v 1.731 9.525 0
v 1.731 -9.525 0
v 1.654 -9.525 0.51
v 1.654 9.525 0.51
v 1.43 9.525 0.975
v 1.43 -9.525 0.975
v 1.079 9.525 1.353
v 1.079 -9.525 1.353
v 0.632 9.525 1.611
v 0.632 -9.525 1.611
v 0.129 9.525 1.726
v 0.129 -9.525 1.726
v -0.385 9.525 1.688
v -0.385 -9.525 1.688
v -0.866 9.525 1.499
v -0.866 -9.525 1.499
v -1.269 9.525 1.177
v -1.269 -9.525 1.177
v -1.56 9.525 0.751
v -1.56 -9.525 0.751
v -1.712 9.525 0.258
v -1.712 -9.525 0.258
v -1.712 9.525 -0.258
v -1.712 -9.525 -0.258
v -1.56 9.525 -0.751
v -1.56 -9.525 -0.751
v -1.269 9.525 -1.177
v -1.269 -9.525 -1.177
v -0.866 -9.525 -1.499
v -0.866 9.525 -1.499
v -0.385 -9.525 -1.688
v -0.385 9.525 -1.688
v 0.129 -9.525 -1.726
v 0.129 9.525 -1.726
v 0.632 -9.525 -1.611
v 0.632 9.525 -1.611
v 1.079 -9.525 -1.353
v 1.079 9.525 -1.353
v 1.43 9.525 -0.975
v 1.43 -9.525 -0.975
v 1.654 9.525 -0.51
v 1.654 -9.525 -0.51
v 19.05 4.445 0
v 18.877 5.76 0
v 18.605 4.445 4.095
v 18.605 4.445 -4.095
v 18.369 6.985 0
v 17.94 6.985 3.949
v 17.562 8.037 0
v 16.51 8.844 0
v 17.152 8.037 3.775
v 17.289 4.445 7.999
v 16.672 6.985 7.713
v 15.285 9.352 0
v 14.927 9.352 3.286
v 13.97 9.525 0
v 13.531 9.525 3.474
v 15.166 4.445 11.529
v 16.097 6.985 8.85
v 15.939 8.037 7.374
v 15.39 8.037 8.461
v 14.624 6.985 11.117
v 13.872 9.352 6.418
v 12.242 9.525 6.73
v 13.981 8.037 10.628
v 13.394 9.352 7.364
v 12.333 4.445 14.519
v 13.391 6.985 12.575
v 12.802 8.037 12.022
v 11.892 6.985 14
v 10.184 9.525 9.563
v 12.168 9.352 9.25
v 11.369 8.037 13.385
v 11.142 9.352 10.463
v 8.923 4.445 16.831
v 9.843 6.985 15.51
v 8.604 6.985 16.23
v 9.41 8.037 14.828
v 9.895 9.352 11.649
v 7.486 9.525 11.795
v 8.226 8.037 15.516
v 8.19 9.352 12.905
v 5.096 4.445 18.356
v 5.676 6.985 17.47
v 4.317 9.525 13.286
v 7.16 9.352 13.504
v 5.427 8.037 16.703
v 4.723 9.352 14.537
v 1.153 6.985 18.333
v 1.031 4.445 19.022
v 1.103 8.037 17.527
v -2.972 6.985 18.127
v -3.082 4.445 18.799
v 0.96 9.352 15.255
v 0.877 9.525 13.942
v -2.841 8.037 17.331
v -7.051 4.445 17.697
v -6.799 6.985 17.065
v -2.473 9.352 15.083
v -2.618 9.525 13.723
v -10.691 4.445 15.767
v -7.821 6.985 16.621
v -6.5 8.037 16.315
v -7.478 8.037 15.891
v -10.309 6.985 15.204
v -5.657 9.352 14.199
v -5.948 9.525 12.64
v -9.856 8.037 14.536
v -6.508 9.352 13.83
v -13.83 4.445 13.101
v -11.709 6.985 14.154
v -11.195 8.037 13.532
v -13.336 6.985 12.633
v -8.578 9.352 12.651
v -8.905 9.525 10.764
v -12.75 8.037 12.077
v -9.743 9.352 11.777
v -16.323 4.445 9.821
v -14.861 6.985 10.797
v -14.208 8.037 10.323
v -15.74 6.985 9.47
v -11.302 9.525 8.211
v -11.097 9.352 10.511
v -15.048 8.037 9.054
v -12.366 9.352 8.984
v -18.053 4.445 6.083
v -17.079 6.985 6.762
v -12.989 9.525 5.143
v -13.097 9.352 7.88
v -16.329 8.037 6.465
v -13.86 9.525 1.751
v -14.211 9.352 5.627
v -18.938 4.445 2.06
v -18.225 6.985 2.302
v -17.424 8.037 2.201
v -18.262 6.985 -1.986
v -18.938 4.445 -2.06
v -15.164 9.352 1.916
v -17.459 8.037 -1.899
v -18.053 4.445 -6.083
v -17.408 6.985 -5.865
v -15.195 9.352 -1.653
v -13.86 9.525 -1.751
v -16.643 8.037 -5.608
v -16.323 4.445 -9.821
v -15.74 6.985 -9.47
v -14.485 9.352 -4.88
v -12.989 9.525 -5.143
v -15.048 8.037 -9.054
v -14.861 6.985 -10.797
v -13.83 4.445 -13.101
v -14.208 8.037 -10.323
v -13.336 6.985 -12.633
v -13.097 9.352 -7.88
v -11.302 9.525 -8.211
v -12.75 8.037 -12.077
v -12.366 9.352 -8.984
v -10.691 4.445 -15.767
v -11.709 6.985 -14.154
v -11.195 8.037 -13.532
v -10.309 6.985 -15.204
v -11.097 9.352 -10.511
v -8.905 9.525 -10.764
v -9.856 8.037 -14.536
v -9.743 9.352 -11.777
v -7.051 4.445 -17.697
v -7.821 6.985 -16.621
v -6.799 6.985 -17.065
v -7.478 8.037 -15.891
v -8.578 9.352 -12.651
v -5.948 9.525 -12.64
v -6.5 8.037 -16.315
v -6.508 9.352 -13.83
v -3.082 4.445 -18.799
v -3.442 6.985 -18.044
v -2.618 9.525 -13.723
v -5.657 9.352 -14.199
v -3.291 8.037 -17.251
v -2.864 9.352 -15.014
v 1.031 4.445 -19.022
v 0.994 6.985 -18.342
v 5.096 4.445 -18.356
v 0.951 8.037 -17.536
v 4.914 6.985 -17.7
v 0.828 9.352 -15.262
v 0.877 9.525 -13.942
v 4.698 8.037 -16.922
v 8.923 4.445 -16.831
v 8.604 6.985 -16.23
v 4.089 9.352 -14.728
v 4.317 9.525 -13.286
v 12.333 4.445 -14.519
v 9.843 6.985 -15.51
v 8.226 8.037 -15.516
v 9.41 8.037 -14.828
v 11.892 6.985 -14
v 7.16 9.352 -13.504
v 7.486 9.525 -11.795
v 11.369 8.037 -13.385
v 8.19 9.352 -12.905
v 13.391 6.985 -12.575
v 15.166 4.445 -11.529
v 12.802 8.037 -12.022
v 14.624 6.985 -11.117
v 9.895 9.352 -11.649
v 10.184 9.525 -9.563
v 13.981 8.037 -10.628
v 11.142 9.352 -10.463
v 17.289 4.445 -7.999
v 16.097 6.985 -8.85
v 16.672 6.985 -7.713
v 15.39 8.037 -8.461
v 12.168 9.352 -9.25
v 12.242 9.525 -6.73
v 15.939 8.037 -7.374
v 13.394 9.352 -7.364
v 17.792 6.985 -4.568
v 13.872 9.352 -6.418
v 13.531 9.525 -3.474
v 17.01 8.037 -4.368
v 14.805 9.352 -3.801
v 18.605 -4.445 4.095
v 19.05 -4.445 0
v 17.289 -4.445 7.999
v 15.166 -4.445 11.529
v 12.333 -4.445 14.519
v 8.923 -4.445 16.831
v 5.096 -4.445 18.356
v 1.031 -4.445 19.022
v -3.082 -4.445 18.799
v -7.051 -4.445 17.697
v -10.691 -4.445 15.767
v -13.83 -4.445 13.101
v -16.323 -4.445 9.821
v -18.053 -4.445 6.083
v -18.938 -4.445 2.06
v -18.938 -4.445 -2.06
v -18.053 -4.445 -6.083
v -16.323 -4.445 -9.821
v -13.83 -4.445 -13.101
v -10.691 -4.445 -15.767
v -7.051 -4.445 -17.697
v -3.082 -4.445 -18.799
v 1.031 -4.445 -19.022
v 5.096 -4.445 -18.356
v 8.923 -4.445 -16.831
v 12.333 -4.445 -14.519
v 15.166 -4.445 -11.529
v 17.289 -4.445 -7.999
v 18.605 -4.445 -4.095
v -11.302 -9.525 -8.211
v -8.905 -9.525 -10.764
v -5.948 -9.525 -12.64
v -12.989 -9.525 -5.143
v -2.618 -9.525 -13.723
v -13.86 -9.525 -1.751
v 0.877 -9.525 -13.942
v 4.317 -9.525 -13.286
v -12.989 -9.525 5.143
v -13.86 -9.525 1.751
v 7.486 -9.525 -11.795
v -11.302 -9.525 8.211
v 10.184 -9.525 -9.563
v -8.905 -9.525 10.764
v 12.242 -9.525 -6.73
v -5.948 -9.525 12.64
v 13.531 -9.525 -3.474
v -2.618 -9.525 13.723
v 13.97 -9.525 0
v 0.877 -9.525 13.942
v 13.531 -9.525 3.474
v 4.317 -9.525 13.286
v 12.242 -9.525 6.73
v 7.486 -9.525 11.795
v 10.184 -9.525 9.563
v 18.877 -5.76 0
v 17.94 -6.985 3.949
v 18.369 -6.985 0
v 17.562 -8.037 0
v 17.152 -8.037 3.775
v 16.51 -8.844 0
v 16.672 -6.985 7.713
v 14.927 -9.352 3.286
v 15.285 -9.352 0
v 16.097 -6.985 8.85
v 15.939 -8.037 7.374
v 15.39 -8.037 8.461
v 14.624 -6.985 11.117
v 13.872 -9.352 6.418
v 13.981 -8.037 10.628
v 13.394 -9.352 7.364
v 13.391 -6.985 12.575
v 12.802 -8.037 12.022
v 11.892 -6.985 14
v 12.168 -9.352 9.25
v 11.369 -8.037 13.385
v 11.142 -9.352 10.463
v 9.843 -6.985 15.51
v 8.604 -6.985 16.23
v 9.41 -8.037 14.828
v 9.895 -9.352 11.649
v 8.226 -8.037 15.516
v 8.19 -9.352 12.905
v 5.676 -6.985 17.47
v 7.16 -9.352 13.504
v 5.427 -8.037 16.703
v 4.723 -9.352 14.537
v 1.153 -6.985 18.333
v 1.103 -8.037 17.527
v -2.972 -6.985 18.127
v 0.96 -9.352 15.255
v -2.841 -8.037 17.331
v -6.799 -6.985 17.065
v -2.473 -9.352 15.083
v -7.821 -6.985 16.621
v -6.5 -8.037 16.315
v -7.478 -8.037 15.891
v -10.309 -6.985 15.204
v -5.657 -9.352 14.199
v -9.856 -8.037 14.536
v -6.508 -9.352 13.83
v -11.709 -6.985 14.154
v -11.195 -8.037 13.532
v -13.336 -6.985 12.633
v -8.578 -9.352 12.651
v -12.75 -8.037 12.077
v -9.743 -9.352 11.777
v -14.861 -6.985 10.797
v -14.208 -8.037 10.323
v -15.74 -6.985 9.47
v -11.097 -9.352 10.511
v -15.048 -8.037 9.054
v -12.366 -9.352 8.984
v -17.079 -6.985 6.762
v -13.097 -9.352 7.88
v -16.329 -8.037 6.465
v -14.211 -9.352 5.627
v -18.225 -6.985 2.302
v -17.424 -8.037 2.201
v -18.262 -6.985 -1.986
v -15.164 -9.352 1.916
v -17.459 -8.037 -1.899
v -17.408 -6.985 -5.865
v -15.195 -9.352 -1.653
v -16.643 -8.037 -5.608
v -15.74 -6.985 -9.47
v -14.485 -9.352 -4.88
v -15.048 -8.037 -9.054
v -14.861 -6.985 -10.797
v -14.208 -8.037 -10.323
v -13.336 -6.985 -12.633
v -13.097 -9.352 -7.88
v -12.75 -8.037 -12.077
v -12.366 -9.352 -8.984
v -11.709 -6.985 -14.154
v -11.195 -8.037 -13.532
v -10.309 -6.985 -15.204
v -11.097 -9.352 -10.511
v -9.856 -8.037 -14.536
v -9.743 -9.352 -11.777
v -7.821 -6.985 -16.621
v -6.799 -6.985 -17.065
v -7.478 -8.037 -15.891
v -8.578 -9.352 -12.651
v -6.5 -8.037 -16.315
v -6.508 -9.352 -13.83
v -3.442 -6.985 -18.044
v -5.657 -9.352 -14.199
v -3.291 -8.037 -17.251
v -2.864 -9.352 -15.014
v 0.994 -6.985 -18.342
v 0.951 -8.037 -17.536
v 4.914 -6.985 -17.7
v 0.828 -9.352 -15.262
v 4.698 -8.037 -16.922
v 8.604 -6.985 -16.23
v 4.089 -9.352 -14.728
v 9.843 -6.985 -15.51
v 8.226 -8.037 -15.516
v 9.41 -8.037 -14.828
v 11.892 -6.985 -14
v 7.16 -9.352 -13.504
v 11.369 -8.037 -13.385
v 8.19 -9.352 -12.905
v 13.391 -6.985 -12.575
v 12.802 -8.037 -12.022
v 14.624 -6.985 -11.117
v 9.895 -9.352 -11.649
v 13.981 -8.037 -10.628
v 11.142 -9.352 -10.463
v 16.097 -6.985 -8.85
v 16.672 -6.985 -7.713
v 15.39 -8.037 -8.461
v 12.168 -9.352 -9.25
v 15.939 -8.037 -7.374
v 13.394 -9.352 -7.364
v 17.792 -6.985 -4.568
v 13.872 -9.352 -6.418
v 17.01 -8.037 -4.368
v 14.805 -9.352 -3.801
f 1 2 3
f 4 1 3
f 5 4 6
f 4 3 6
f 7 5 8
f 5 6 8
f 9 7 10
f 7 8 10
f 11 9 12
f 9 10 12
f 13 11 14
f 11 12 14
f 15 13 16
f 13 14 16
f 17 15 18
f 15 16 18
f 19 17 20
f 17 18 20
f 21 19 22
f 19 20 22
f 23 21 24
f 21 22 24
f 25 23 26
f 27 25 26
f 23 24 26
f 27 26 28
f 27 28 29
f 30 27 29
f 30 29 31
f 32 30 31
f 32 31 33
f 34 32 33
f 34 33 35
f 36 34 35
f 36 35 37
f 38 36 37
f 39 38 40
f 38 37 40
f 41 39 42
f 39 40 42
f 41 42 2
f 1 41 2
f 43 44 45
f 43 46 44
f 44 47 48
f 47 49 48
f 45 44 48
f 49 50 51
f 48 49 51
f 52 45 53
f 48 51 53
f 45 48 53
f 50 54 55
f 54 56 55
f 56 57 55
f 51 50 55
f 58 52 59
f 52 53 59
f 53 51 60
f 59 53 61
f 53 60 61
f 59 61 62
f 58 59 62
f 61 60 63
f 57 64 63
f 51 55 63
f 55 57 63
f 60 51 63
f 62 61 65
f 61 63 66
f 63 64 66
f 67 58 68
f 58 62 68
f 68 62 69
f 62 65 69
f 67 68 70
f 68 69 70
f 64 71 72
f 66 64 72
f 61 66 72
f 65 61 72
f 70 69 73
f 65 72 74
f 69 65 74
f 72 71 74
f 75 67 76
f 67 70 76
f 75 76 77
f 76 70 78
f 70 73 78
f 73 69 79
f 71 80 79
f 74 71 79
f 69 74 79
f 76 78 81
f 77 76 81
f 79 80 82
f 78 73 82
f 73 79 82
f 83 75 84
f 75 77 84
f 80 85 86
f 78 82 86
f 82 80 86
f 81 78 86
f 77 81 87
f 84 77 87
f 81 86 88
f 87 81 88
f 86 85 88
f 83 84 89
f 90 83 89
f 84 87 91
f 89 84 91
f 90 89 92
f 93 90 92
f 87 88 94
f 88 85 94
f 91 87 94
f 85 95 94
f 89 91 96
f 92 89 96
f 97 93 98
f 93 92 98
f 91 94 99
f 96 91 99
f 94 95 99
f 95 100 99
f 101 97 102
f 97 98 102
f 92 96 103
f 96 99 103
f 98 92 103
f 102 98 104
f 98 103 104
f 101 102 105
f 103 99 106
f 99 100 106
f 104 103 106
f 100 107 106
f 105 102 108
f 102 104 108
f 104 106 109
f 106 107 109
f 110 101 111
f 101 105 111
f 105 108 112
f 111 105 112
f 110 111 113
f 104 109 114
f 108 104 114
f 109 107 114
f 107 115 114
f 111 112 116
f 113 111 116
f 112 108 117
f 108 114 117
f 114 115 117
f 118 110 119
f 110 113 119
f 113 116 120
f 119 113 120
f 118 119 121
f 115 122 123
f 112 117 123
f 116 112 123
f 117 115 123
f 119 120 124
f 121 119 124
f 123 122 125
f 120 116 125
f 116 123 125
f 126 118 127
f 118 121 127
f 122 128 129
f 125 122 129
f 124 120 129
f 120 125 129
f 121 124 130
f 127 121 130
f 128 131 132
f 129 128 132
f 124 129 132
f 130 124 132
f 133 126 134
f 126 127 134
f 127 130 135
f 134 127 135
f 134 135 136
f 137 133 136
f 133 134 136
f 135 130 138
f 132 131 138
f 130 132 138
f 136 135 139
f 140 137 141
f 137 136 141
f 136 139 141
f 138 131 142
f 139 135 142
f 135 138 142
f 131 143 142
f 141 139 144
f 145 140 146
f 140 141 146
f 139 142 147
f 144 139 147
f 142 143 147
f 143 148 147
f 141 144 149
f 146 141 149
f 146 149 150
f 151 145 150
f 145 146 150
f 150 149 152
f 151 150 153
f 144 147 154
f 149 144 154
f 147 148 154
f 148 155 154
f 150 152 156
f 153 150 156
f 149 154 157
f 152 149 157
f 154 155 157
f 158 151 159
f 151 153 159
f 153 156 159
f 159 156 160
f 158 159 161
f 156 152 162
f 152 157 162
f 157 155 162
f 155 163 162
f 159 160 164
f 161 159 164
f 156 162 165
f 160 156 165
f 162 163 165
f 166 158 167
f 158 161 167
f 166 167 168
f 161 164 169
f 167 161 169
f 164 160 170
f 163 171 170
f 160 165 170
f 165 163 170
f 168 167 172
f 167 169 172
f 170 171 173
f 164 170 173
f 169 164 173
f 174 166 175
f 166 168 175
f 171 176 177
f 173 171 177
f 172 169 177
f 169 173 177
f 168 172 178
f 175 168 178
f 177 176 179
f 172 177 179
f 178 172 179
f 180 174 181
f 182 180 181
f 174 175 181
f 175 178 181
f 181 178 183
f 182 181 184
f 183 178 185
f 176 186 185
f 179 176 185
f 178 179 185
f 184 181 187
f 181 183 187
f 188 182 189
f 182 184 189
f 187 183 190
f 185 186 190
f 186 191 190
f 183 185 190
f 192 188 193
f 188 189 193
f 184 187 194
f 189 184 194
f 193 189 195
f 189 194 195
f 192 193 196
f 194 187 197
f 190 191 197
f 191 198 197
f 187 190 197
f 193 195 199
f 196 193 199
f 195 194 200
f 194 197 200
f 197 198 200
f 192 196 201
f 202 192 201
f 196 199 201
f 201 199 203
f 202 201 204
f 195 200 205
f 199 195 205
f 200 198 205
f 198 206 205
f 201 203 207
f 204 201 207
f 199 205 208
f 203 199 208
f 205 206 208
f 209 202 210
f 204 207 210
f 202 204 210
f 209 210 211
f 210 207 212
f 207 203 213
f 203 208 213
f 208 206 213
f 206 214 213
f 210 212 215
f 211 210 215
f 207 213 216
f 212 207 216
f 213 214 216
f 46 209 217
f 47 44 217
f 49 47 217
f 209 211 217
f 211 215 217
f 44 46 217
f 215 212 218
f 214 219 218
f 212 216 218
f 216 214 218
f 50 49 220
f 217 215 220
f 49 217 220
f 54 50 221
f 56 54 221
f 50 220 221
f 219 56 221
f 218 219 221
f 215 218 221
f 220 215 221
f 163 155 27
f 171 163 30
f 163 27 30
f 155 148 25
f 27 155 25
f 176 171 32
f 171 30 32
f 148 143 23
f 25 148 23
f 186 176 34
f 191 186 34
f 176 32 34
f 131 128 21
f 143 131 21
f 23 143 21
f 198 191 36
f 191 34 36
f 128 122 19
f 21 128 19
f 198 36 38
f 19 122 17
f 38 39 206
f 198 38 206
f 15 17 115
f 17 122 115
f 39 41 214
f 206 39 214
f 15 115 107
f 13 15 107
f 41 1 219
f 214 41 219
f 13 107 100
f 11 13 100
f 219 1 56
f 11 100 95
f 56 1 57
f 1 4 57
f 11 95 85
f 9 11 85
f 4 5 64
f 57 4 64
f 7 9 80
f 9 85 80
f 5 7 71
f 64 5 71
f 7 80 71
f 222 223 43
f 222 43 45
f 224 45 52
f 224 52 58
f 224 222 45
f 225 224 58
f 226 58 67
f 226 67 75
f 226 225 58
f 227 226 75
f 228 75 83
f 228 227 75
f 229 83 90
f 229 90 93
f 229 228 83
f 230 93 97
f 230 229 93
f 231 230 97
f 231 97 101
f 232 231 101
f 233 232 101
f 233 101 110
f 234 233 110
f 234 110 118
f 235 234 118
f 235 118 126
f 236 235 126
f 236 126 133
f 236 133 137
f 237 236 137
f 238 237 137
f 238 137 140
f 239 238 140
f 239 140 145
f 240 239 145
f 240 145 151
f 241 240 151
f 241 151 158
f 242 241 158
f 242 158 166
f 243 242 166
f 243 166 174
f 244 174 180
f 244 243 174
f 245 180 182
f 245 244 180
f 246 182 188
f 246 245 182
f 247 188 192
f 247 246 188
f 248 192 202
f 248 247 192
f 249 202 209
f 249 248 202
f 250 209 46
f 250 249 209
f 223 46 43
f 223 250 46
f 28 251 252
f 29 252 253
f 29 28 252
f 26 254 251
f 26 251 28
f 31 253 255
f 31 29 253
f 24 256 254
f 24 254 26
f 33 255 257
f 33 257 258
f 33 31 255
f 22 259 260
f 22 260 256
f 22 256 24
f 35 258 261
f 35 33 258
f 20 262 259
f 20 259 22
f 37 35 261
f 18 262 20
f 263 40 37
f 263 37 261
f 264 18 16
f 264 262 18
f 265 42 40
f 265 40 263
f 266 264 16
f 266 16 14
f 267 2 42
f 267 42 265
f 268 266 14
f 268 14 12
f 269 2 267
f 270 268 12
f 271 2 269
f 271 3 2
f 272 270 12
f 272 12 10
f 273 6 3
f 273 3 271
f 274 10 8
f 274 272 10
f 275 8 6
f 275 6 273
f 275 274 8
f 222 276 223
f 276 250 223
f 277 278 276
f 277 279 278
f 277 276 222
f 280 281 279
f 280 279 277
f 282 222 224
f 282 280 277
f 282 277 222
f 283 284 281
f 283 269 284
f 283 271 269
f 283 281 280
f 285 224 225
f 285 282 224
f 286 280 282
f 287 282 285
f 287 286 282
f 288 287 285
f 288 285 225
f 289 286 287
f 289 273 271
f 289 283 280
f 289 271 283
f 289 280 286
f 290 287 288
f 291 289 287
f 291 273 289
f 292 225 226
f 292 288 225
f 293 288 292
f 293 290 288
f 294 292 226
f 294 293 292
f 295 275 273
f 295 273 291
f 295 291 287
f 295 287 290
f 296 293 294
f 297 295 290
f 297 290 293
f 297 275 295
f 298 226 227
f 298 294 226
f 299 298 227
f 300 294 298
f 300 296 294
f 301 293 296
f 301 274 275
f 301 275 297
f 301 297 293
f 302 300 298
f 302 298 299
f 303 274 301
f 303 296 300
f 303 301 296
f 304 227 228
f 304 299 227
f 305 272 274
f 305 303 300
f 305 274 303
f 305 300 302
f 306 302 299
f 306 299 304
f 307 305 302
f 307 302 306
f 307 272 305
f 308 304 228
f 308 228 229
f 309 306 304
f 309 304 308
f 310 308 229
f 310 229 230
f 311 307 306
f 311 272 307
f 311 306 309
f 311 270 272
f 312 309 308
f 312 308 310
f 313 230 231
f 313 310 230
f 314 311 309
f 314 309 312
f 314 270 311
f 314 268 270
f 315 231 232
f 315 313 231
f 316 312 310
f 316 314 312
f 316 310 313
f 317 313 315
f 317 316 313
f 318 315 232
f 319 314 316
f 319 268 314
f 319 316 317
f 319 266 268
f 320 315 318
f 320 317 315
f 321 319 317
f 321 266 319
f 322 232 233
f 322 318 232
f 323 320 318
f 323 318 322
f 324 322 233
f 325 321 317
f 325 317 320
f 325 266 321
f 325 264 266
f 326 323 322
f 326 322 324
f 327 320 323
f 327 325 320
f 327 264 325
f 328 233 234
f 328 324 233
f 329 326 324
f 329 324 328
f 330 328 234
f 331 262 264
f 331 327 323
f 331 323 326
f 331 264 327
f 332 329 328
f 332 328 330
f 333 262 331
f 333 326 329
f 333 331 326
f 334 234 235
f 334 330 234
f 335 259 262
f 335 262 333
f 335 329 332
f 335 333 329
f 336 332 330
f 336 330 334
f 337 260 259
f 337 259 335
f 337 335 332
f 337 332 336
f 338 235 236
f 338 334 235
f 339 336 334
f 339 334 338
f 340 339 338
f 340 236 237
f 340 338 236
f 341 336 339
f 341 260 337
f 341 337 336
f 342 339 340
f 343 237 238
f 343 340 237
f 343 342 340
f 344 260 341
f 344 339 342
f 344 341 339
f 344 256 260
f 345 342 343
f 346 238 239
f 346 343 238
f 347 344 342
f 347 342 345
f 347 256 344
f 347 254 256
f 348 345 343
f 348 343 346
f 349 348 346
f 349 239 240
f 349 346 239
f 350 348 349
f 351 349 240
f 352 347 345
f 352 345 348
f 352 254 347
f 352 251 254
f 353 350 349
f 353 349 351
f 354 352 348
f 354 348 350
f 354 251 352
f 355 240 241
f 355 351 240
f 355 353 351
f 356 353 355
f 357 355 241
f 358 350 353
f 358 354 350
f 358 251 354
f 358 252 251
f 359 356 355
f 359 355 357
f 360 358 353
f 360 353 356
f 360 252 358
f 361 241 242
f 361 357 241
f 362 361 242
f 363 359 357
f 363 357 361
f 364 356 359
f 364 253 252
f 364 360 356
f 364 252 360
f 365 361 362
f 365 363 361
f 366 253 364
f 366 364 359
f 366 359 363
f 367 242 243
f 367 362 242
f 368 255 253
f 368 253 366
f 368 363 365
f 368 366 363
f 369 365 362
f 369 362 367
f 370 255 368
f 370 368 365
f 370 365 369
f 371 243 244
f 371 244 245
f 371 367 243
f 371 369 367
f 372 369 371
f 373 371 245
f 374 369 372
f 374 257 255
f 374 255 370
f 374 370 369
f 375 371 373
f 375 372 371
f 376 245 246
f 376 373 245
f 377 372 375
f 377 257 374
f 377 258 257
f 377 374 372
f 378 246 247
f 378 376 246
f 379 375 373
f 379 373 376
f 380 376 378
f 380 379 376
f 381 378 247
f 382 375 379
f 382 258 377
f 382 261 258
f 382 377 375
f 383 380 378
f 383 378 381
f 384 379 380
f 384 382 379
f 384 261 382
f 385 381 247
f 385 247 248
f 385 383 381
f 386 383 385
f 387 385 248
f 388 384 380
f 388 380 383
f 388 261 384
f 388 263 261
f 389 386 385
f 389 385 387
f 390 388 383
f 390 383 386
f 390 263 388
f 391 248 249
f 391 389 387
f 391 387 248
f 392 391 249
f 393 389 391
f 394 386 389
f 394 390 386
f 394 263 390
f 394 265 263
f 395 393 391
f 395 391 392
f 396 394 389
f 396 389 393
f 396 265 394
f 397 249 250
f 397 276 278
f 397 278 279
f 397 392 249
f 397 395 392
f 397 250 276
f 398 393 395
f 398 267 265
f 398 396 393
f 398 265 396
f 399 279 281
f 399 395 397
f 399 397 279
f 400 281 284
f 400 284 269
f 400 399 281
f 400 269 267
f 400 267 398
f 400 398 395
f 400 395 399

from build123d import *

# Parameters (mm, degrees)
F0_R     = 19.05
F1_DEPTH = 9.525
F2_R     = 5.08
F3_R     = 1.731017
F4_DEPTH = 19.05


with BuildPart() as f1:
    # F0 (on Front) → F1 (new body, symmetric)
    with BuildSketch(Plane.XZ):
        Circle(F0_R)
    extrude(amount=F1_DEPTH, both=True)

    # F2
    f2_edges = [f1.edges().sort_by_distance(p)[0] for p in [
        (-19.05, -9.525, 0),
        (-19.05, 9.525, 0),
    ]]
    fillet(f2_edges, radius=F2_R)

    # F3 (on face) → F4 (cut)
    with BuildSketch(Plane.XZ.offset(9.525)):
        Circle(F3_R)
    extrude(amount=-F4_DEPTH, mode=Mode.SUBTRACT)


solid = f1.part
